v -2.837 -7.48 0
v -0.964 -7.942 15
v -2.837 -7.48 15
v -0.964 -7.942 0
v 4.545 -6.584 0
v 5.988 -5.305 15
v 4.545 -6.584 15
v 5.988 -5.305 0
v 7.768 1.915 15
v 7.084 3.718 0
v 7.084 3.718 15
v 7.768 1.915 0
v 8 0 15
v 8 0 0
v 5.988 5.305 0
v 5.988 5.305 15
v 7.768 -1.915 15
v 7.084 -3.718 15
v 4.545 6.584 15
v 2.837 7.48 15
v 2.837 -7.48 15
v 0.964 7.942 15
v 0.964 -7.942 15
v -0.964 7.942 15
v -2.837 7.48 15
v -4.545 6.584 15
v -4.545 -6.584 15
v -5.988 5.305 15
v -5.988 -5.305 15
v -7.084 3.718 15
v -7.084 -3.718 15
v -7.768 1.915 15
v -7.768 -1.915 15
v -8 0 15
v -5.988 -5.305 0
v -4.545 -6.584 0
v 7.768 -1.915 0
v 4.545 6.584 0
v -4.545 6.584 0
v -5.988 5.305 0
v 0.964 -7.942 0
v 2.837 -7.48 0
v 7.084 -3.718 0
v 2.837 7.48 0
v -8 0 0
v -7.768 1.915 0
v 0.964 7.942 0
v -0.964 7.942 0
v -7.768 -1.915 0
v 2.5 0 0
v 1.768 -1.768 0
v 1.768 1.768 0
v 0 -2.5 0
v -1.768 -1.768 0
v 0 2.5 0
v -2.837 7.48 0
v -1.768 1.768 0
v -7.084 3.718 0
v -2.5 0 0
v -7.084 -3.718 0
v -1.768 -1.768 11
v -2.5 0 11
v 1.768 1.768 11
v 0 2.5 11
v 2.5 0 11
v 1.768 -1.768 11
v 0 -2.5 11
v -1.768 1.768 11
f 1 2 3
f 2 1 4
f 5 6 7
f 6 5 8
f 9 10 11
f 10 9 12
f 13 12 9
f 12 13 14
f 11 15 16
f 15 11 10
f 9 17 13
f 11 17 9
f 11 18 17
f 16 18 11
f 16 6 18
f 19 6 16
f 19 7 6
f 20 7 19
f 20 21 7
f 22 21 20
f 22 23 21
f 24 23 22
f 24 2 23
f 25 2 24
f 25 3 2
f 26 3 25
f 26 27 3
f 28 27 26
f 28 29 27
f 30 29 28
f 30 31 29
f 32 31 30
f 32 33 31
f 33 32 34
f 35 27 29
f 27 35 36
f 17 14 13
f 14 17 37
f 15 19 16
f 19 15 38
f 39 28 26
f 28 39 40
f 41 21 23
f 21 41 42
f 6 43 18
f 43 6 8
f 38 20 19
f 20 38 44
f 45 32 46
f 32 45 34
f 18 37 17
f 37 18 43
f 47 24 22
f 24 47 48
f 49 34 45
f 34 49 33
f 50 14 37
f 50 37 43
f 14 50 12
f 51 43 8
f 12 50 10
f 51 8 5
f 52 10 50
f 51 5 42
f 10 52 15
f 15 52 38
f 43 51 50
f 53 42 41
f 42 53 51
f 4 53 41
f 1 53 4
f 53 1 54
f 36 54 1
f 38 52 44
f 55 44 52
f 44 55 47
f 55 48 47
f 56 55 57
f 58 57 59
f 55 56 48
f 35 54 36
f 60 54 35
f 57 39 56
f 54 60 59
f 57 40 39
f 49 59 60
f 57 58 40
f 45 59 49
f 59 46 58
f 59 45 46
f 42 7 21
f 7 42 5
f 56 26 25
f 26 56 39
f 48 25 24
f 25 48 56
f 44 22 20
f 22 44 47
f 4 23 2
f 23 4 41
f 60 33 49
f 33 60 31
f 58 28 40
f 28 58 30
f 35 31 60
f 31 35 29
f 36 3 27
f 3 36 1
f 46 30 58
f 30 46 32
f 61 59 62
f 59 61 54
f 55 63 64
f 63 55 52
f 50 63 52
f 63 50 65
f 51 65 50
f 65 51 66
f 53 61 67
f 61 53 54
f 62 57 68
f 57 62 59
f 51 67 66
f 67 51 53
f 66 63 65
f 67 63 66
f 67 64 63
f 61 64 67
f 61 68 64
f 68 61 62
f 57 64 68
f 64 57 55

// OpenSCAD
// Soviet to MX key cap converter
// Brett Hallen, Aug 2025
// NOT FINISHED

// Define the MX & Soviet dimensions
mx_cross_height = 4;
mx_cross_length = 4;
mx_cross_width = 1.3;
mx_outer_radius = 8;
soviet_height = 11;
soviet_radius = 2.5;

// Create the main cylinder
// Subtract the inner cylinder for the Soviet key stem
// Subtract the MX cross 
difference() 
{
  cylinder(h=soviet_height+mx_cross_height, r=mx_outer_radius);

  // Define the inner cylinder (to be subtracted)
  translate([0, 0, 0]) 
  { // Center the inner cylinder
    cylinder(h=soviet_height, r=soviet_radius);
  }

    cube([mx_cross_length,mx_cross_width,mx_cross_height],center=true);
    
    rotate([90,0,0])
    {
        cube([mx_cross_width,mx_cross_length,mx_cross_height],center=true);
    }
}
